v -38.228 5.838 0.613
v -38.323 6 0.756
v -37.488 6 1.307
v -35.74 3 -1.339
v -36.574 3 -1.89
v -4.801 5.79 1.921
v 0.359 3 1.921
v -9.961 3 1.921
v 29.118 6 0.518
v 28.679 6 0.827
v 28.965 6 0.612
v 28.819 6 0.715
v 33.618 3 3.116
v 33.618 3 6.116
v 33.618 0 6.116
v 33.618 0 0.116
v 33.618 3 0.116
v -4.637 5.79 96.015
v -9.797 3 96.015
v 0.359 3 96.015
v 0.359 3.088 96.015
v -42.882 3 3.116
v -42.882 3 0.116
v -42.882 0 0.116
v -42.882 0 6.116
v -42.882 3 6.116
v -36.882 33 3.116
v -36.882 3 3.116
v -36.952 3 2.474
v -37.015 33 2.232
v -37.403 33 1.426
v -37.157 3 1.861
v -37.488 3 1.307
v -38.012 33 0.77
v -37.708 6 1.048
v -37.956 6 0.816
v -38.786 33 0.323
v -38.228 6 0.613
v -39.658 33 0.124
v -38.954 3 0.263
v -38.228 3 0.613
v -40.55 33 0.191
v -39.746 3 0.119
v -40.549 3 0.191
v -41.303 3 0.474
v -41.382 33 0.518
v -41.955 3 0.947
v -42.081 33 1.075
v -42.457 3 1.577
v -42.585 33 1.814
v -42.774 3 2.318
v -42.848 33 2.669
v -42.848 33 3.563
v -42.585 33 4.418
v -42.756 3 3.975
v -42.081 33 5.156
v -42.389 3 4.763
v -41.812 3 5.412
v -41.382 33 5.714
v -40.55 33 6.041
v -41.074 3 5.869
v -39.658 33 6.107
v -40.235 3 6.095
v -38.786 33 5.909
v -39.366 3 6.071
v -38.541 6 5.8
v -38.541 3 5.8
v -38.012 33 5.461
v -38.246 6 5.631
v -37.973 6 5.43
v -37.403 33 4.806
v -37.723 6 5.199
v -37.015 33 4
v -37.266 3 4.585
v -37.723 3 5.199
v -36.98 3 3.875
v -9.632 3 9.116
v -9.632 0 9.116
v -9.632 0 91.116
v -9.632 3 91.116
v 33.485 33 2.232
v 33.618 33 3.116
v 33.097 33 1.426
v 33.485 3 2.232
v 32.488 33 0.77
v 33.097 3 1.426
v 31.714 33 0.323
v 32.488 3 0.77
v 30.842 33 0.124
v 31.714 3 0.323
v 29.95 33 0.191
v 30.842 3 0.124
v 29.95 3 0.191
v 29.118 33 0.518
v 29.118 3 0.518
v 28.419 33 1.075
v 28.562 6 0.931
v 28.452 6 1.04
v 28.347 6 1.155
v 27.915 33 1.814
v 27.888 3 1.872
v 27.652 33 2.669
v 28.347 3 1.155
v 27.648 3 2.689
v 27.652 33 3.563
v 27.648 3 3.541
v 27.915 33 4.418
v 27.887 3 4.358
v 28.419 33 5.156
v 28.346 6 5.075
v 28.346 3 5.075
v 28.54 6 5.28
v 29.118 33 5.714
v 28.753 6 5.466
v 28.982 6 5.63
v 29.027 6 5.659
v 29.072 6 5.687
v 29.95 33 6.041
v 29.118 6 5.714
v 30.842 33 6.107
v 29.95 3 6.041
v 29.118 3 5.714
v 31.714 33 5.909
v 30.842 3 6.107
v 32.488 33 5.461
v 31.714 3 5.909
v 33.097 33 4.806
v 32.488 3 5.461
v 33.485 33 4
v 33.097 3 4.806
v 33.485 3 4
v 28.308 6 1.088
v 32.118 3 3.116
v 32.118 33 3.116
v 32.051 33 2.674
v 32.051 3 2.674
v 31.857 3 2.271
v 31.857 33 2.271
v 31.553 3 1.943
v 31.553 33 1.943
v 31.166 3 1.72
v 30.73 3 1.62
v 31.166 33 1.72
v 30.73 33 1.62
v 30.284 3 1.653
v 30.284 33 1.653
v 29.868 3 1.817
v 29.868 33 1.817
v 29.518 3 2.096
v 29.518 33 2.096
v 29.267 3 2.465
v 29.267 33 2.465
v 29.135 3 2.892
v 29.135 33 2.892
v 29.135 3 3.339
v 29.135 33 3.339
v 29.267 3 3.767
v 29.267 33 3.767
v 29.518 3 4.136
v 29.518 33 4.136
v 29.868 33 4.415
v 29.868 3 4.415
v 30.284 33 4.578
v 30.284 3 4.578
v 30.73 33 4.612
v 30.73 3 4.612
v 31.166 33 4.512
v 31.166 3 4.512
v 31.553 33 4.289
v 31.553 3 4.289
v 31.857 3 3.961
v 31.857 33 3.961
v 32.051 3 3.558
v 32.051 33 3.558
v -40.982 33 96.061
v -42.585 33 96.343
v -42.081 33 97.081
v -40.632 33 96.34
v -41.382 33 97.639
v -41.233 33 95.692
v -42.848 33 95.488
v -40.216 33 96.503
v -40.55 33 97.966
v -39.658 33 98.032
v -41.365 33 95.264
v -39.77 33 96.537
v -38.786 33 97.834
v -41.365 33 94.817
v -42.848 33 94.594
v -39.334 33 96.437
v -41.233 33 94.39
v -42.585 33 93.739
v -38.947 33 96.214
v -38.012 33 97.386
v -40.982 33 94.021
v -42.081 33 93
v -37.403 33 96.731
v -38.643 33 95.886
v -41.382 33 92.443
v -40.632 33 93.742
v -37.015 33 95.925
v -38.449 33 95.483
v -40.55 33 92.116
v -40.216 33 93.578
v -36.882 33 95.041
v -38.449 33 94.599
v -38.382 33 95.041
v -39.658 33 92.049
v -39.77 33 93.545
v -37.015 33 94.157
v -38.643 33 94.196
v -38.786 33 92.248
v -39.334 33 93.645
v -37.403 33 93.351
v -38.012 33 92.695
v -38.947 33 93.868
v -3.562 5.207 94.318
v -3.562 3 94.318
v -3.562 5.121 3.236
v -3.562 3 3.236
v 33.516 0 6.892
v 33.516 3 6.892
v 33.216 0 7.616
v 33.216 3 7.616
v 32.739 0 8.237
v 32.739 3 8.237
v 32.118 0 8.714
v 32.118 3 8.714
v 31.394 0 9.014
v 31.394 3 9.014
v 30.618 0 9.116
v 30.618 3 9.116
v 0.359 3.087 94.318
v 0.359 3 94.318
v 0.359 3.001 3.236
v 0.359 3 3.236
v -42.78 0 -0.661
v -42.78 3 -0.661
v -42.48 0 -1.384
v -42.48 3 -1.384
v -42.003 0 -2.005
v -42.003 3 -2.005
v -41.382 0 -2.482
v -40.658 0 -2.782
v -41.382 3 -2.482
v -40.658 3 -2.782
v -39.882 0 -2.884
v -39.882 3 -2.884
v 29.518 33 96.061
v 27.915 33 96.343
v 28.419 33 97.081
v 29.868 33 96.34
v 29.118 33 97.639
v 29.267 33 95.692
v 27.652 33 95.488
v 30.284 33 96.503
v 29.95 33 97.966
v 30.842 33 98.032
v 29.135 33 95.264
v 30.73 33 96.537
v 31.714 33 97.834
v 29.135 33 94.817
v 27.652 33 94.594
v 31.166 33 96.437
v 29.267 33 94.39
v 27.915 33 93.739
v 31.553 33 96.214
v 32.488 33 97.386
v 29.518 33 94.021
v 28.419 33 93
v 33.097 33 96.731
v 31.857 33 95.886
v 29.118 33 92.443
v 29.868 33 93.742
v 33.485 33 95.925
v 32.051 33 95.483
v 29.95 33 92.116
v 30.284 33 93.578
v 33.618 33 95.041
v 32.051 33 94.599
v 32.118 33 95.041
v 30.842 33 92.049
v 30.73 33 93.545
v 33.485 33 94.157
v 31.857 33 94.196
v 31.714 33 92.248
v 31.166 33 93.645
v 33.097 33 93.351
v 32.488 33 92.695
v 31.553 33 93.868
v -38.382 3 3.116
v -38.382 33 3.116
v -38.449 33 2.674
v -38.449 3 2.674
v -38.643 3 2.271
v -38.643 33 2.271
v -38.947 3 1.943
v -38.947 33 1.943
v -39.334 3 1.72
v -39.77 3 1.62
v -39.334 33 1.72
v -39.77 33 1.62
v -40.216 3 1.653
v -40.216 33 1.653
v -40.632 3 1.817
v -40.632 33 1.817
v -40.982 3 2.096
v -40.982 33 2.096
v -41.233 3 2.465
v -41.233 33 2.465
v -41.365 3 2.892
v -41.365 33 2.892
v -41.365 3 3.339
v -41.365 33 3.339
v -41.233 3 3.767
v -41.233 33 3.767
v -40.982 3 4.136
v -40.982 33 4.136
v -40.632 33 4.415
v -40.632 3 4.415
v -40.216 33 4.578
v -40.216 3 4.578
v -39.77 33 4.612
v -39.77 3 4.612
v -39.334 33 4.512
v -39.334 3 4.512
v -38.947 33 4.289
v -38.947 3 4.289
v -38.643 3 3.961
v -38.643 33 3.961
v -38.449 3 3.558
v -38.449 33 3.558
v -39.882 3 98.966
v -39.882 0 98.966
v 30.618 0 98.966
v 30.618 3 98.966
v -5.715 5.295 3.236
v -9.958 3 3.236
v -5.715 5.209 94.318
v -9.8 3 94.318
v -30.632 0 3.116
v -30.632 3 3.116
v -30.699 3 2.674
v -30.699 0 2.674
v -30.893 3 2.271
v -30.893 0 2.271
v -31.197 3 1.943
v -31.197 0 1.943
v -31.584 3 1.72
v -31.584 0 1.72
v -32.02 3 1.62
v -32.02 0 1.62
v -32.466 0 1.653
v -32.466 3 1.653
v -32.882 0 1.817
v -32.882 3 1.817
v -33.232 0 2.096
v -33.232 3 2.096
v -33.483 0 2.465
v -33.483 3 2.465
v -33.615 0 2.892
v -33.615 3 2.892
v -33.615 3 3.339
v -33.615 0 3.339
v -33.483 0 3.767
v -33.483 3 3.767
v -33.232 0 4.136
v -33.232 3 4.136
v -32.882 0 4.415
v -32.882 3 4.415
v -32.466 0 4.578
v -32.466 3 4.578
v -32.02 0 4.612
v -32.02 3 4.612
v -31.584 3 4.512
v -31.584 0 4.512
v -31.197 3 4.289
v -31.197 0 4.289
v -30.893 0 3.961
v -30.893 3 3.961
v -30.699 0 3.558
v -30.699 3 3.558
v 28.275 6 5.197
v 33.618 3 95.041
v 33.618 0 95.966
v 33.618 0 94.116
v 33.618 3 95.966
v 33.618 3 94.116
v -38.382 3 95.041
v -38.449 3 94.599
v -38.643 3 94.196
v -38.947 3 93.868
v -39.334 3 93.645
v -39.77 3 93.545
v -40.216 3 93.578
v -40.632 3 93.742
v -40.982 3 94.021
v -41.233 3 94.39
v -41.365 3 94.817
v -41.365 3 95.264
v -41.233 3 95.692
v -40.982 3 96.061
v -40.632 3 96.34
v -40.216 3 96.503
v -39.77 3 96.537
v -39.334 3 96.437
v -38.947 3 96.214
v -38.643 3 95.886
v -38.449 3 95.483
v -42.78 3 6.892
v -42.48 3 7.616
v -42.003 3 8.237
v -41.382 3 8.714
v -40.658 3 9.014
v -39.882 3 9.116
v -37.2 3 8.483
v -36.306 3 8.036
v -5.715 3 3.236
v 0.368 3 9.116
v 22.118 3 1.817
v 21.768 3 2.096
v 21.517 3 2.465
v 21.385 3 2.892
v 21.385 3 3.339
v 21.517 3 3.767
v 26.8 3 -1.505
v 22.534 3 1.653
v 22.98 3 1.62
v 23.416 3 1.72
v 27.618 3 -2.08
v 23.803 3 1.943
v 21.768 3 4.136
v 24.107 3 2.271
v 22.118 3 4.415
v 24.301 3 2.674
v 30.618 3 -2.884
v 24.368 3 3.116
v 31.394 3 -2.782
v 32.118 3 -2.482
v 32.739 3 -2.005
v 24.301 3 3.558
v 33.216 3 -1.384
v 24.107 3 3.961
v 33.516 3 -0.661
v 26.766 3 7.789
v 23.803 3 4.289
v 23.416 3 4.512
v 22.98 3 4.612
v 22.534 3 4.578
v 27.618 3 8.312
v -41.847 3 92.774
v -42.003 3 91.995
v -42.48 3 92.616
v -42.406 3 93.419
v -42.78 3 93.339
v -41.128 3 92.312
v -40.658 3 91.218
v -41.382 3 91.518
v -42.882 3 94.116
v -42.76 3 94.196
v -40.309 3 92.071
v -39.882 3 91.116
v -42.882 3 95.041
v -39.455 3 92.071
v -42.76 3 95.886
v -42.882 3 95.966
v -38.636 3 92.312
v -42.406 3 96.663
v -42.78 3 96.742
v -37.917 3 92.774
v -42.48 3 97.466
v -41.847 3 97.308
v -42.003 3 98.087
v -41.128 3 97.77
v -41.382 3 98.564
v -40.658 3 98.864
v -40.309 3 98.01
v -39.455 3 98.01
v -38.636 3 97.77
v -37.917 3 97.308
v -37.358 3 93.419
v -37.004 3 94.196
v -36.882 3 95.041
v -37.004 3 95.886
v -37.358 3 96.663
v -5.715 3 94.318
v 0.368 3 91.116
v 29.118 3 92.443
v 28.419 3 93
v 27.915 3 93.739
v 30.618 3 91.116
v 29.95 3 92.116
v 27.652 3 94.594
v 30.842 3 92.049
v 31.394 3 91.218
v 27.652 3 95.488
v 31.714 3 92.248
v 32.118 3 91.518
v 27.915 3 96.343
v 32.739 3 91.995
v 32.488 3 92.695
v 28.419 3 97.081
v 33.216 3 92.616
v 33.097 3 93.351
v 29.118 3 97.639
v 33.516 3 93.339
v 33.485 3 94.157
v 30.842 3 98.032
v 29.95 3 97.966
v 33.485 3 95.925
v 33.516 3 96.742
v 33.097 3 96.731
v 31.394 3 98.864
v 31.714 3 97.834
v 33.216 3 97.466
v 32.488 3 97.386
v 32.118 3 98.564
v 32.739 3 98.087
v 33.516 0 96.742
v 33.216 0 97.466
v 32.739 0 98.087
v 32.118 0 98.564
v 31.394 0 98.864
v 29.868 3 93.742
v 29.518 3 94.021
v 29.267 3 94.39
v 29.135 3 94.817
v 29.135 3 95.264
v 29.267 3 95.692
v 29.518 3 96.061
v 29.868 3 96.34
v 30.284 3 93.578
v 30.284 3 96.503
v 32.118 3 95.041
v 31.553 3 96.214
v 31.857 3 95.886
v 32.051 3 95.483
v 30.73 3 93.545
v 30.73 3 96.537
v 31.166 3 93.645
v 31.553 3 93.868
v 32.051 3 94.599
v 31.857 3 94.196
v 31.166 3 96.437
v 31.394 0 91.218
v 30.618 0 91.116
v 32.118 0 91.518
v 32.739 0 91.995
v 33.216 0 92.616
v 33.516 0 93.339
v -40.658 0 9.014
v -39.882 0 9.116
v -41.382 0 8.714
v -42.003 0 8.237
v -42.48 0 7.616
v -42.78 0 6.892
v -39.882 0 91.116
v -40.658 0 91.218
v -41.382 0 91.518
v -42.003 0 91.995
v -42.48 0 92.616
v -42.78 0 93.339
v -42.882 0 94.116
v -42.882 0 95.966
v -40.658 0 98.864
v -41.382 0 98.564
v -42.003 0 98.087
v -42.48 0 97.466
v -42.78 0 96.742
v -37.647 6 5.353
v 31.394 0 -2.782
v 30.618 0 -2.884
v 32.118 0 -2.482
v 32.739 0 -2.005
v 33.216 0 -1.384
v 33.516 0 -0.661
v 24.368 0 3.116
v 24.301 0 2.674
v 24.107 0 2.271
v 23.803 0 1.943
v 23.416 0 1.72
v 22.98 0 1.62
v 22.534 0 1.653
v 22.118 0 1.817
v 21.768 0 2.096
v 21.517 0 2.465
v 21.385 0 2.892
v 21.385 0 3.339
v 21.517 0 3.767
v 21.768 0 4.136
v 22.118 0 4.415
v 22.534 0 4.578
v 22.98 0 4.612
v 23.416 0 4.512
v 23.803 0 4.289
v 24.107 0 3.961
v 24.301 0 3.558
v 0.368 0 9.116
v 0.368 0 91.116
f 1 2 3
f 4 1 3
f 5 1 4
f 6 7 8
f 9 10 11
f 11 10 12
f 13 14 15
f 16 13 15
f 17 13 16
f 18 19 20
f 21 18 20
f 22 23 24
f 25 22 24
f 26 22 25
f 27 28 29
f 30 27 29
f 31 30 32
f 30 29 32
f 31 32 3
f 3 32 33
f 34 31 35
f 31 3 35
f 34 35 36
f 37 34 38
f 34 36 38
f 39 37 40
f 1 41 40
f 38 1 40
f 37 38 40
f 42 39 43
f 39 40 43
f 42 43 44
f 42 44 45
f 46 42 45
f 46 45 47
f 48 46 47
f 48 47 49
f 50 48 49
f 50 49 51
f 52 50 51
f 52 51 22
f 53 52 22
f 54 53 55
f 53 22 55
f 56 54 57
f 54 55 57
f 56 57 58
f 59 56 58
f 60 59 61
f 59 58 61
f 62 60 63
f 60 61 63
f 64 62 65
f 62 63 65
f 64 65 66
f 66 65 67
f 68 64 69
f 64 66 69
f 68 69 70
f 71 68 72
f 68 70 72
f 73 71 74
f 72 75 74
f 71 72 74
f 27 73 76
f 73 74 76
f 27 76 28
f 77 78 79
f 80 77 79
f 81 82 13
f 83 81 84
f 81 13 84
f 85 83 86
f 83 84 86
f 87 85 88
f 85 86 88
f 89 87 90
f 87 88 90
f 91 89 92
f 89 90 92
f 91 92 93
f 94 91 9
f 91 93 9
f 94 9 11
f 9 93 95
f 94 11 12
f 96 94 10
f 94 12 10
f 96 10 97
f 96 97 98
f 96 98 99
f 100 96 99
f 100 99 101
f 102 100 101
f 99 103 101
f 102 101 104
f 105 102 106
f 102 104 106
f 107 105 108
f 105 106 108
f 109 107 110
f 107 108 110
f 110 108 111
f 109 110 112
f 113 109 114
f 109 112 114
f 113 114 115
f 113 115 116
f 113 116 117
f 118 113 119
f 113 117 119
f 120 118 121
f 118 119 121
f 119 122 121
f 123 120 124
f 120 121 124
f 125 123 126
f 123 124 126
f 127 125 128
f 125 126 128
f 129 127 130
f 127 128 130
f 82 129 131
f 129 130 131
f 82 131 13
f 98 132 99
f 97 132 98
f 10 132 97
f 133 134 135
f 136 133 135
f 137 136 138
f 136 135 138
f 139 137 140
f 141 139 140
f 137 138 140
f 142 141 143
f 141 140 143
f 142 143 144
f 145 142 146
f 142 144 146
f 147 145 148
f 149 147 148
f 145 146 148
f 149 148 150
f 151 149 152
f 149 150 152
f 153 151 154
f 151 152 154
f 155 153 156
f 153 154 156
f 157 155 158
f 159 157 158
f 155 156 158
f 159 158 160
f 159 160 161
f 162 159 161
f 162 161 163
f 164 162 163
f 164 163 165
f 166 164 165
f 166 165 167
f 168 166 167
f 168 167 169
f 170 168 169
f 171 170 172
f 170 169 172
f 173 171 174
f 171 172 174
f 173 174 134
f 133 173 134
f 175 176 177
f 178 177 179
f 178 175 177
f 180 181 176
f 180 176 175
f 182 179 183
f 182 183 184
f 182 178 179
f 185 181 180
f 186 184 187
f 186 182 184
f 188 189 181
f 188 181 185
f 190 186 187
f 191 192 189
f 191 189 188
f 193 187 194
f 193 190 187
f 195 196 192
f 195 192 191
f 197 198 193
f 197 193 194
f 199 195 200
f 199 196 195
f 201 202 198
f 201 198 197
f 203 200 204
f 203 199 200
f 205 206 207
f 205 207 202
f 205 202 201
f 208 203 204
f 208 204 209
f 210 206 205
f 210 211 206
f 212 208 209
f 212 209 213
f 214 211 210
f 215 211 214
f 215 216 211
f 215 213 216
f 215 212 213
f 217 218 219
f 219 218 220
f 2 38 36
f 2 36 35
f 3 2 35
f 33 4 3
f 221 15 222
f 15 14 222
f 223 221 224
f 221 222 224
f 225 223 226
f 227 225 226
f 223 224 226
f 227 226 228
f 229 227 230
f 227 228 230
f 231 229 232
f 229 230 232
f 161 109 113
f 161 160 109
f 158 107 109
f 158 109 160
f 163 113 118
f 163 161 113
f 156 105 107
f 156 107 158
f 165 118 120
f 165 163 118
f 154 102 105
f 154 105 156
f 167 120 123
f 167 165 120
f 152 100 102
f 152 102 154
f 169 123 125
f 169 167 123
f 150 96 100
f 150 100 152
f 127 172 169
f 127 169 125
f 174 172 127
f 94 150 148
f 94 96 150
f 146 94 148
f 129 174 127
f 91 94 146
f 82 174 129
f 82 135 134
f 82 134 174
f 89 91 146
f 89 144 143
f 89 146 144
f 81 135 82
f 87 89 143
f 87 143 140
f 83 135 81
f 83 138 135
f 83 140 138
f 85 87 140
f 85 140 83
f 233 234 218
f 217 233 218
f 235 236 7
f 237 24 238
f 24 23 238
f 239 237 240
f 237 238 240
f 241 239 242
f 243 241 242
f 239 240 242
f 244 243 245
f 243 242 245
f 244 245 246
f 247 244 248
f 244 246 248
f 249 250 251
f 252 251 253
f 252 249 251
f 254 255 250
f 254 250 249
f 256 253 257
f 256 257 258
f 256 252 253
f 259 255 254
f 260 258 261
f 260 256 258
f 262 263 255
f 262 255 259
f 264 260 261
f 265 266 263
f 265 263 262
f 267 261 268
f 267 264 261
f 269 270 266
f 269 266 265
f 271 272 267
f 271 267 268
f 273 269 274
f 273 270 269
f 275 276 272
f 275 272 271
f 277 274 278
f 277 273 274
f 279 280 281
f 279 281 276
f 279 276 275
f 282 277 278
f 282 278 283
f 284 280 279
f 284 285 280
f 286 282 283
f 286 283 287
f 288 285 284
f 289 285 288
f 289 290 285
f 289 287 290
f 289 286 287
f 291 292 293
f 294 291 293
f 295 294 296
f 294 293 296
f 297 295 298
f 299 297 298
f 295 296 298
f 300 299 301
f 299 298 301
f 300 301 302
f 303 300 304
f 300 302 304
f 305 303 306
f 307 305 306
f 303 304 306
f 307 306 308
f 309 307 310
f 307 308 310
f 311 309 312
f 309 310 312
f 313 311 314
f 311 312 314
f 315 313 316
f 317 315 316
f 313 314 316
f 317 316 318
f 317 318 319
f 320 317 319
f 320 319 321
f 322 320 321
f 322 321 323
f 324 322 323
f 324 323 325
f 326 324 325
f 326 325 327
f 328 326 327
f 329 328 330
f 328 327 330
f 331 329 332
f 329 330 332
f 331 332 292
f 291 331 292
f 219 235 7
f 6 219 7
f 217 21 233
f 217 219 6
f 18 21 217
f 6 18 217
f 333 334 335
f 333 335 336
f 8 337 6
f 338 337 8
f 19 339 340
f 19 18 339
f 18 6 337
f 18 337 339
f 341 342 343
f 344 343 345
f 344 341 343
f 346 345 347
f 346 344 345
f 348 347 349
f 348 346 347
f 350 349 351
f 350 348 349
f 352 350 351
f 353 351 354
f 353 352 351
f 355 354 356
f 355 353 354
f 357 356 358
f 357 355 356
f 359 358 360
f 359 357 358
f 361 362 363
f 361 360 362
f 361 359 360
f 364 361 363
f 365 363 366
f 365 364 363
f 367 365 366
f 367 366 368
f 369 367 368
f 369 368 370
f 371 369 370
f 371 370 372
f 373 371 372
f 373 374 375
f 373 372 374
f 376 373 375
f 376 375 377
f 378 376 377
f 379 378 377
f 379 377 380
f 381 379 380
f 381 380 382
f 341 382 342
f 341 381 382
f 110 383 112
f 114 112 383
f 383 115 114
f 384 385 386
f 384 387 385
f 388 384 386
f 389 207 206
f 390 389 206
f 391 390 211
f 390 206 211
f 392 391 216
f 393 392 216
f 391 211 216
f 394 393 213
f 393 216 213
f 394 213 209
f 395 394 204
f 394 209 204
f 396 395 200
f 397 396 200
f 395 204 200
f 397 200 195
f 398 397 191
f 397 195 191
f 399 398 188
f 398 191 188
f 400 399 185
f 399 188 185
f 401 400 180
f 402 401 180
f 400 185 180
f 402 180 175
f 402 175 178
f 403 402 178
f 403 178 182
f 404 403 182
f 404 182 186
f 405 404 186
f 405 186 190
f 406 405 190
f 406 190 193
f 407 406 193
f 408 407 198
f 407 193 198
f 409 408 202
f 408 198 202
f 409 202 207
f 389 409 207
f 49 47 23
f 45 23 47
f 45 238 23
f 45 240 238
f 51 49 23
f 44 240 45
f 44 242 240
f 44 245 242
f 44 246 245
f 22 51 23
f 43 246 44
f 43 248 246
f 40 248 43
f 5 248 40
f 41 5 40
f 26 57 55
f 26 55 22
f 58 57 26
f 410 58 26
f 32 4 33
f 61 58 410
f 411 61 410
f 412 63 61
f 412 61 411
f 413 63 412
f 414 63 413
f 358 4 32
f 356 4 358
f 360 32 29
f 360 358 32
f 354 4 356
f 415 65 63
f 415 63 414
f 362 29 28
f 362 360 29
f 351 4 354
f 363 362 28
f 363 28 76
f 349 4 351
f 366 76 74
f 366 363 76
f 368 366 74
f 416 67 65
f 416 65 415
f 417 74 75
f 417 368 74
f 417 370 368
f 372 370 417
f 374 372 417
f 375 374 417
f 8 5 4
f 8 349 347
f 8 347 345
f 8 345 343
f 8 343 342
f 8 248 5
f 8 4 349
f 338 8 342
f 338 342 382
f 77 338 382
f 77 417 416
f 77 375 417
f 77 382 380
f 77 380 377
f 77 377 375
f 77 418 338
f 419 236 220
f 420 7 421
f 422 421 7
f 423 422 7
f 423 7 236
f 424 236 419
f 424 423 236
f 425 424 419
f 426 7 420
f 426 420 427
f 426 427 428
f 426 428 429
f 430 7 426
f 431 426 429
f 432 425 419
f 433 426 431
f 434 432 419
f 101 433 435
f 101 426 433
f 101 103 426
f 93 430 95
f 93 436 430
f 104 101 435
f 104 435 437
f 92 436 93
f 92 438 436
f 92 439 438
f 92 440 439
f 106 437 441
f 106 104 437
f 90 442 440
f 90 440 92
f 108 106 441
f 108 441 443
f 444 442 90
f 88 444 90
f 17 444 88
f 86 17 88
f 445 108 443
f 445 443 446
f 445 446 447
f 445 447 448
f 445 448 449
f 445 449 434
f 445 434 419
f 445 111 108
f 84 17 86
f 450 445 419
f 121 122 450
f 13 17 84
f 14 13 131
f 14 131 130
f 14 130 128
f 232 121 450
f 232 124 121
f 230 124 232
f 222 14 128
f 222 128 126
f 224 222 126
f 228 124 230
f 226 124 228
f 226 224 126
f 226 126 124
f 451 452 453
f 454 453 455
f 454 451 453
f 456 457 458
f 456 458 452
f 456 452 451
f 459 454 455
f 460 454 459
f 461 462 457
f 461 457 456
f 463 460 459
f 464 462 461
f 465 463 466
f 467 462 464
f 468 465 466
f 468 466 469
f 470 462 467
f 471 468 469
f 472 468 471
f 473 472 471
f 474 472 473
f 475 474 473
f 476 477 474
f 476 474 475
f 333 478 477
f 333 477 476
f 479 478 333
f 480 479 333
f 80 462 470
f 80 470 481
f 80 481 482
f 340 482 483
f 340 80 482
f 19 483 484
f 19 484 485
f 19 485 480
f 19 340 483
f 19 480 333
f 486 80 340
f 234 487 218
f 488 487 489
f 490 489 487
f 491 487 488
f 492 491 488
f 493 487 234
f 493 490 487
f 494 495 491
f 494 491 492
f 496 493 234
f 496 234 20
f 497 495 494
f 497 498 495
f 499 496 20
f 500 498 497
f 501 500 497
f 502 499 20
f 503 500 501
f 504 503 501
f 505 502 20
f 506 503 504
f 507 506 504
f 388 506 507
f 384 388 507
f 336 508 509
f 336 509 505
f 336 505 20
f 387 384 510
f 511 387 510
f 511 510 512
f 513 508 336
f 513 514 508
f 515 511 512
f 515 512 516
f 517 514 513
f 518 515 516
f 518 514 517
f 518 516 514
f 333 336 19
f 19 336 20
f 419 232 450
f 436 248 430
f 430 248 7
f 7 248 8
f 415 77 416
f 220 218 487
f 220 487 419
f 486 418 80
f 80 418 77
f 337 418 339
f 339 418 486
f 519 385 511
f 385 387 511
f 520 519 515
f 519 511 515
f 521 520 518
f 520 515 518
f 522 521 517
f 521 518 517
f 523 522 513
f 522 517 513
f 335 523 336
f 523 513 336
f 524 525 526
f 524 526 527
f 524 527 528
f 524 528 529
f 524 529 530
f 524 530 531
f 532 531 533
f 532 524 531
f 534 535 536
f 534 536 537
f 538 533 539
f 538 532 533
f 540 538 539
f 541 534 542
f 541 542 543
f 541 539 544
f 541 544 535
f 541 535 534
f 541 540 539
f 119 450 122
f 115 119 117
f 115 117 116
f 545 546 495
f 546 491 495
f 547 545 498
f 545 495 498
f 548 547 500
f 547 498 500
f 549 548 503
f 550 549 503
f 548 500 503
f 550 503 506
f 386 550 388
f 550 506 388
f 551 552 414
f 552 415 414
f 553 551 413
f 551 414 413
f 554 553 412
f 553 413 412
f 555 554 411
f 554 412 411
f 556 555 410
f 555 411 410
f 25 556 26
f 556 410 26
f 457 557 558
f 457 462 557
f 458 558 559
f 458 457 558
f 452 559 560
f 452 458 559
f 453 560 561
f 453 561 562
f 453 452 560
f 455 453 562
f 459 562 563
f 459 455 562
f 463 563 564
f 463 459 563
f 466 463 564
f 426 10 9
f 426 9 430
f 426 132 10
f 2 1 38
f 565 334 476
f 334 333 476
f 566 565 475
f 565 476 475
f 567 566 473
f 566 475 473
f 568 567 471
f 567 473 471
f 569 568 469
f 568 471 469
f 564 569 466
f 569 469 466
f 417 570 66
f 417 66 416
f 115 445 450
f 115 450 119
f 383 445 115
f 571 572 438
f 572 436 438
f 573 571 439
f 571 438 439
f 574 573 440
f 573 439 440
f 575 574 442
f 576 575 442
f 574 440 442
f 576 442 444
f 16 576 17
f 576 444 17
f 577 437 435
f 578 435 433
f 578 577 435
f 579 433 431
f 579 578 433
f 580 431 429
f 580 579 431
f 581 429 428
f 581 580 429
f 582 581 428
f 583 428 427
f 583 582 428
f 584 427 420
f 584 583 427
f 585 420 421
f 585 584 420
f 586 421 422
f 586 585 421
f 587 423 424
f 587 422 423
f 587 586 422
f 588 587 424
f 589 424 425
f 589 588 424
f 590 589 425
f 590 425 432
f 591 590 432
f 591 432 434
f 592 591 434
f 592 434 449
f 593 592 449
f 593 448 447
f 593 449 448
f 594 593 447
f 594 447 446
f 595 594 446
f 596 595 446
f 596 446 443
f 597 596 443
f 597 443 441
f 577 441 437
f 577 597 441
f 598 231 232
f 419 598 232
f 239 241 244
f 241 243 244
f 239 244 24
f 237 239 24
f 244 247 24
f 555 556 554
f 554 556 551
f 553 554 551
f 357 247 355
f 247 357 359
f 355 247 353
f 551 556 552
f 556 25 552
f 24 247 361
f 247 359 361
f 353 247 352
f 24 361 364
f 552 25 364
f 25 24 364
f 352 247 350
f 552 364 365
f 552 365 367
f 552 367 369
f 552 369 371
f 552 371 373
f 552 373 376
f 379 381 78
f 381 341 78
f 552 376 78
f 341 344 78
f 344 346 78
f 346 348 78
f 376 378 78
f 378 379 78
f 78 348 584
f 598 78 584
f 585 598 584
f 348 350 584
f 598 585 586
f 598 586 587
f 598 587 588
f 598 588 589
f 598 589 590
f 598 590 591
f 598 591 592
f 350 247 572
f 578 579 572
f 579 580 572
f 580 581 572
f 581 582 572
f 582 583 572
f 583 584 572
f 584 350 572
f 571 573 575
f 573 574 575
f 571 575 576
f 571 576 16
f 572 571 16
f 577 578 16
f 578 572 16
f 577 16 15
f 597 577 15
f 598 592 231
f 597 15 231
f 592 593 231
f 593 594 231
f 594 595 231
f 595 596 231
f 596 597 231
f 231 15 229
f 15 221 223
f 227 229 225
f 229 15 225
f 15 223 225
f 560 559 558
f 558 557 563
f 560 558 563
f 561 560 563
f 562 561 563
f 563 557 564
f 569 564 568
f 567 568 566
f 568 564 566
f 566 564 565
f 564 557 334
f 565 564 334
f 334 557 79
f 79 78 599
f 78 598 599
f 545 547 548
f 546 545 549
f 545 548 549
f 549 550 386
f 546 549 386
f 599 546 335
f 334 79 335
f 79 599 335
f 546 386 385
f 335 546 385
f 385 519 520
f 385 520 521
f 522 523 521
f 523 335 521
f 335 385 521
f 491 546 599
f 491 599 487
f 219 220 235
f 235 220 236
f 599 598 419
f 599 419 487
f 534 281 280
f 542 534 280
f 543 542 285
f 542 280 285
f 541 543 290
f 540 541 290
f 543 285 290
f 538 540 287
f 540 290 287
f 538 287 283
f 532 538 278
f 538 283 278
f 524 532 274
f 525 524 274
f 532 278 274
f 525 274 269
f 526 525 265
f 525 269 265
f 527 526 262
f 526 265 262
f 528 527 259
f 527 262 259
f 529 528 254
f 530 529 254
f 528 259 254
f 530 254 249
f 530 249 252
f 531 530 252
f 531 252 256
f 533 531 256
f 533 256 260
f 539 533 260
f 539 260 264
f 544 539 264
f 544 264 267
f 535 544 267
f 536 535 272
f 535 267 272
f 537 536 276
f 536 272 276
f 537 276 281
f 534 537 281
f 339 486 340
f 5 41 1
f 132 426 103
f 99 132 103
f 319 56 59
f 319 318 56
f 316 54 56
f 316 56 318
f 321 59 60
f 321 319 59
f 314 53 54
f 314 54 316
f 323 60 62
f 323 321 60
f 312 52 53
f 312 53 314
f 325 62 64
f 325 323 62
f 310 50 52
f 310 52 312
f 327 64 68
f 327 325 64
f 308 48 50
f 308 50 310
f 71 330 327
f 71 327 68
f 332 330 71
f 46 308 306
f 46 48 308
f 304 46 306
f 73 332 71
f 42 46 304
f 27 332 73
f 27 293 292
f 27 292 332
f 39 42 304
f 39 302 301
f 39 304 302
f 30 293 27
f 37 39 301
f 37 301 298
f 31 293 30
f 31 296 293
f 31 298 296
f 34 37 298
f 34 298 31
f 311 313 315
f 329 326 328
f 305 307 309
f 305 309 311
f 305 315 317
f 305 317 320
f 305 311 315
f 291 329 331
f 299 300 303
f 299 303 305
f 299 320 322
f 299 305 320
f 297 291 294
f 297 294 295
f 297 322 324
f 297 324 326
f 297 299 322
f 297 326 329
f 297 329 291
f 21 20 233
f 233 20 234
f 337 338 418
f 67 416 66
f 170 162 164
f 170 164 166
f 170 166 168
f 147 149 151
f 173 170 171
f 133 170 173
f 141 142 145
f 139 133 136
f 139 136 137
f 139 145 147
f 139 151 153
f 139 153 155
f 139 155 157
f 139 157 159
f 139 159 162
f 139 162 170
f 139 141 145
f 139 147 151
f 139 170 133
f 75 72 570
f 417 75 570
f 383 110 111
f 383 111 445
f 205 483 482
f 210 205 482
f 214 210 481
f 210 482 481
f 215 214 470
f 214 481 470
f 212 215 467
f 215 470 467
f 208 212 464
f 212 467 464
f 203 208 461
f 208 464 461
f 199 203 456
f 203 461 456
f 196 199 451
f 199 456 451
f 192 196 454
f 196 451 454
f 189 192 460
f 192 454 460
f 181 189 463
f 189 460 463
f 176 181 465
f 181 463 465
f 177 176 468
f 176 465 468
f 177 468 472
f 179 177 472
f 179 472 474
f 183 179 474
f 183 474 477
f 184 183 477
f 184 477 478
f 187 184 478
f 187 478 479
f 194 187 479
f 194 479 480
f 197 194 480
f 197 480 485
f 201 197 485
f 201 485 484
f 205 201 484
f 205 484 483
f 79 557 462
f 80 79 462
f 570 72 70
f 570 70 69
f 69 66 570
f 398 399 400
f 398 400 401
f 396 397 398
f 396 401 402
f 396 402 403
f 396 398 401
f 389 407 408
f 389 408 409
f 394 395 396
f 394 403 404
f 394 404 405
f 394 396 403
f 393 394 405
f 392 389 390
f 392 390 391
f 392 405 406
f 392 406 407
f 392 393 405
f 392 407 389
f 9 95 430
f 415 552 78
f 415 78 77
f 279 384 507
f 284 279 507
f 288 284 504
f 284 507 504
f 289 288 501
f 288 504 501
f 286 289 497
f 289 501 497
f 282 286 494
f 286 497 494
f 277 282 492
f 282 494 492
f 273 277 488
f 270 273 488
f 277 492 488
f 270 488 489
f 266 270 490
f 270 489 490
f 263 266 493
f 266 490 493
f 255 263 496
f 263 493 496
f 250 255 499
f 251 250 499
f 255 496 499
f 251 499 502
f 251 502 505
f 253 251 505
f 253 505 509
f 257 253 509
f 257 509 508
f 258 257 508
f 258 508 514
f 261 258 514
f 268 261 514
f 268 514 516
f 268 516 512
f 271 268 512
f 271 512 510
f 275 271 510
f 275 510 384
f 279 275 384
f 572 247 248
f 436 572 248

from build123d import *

# Parameters (mm, degrees)
SKETCH_1_W          = 70.5
SKETCH_1_H          = 12
SKETCH_1_R          = 1.5
EXTRUDE_2_DEPTH     = 4
SKETCH_3_W          = 10
SKETCH_3_H          = 82
EXTRUDE_3_DEPTH     = 3
EXTRUDE_4_DEPTH     = 3
SKETCH_5_W          = 70.5
SKETCH_5_H          = 12.216564443
CUT_EXTRUDE_1_DEPTH = 1
SKETCH_6_R          = 3
EXTRUDE_5_DEPTH     = 30
SKETCH_7_W          = 12
SKETCH_7_H          = 3
EXTRUDE_6_DEPTH     = 3
SKETCH_8_W          = 12
SKETCH_8_H          = 3
EXTRUDE_7_DEPTH     = 3
SKETCH_10_W         = 7.85
SKETCH_10_H         = 3
EXTRUDE_8_DEPTH     = 3
SKETCH_11_W         = 7.85
SKETCH_11_H         = 3
EXTRUDE_9_DEPTH     = 3
FILLET_1_R          = 3
EXTRUDE_10_DEPTH    = 3
SKETCH_26_R         = 1.5
CUT_EXTRUDE_2_DEPTH = 30
SKETCH_28_R         = 1.5
CUT_EXTRUDE_3_DEPTH = 30
SKETCH_30_R         = 1.5
CUT_EXTRUDE_4_DEPTH = 30
SKETCH_29_R         = 1.5
CUT_EXTRUDE_5_DEPTH = 30


with BuildPart() as part:
    # 草图1 → 凸台-拉伸2 (new body)
    with BuildSketch(Plane(origin=(0, 0, 0), x_dir=(1, 0, 0), z_dir=(0, 1, 0))):
        with Locations((-4.632001312, -3.115886014)):
            Rectangle(SKETCH_1_W, SKETCH_1_H)
        with Locations((-32.132001312, -3.115886014)):
            Circle(SKETCH_1_R, mode=Mode.SUBTRACT)
        with Locations((22.867998688, -3.115886014)):
            Circle(SKETCH_1_R, mode=Mode.SUBTRACT)
    extrude(amount=EXTRUDE_2_DEPTH)

    # 草图3 → 凸台-拉伸3 (add)
    with BuildSketch(Plane.XZ):
        with Locations((-4.632001312, 50.115886014)):
            Rectangle(SKETCH_3_W, SKETCH_3_H)
    extrude(amount=-EXTRUDE_3_DEPTH)

    # 草图4 → 凸台-拉伸4 (add)
    with BuildSketch(Plane(origin=(0, 3, 0), x_dir=(1, 0, 0), z_dir=(0, 1, 0))):
        Polygon((-4.632001312, -91.115886014), (-39.882001312, -91.115886014), (-39.882001312, -98.965886014), (30.617998688, -98.965886014), (30.617998688, -91.115886014), align=None)
    extrude(amount=-EXTRUDE_4_DEPTH)

    # 草图5 → 切除-拉伸1 (cut)
    with BuildSketch(Plane(origin=(0, 4, 0), x_dir=(1, 0, 0), z_dir=(0, 1, 0))):
        with Locations((-4.632001312, -3.224168236)):
            Rectangle(SKETCH_5_W, SKETCH_5_H)
    extrude(amount=-CUT_EXTRUDE_1_DEPTH, mode=Mode.SUBTRACT)

    # 草图6 → 凸台-拉伸5 (add)
    with BuildSketch(Plane(origin=(0, 3, 0), x_dir=(1, 0, 0), z_dir=(0, 1, 0))):
        with Locations((30.617998688, -3.115886014)):
            Circle(SKETCH_6_R)
        with Locations((-39.882001312, -3.115886014)):
            Circle(SKETCH_6_R)
        with Locations((30.617998688, -95.040886014)):
            Circle(SKETCH_6_R)
        with Locations((-39.882001312, -95.040886014)):
            Circle(SKETCH_6_R)
    extrude(amount=EXTRUDE_5_DEPTH)

    # 草图7 → 凸台-拉伸6 (add)
    with BuildSketch(Plane(origin=(30.617998688, 0, 0), x_dir=(0, 0, -1), z_dir=(1, 0, 0))):
        with Locations((-3.115886014, 1.5)):
            Rectangle(SKETCH_7_W, SKETCH_7_H)
    extrude(amount=EXTRUDE_6_DEPTH)

    # 草图8 → 凸台-拉伸7 (add)
    with BuildSketch(Plane.ZY.offset(39.882001312)):
        with Locations((3.115886014, 1.5)):
            Rectangle(SKETCH_8_W, SKETCH_8_H)
    extrude(amount=EXTRUDE_7_DEPTH)

    # 草图10 → 凸台-拉伸8 (add)
    with BuildSketch(Plane(origin=(30.617998688, 0, 0), x_dir=(0, 0, -1), z_dir=(1, 0, 0))):
        with Locations((-95.040886014, 1.5)):
            Rectangle(SKETCH_10_W, SKETCH_10_H)
    extrude(amount=EXTRUDE_8_DEPTH)

    # 草图11 → 凸台-拉伸9 (add)
    with BuildSketch(Plane.ZY.offset(39.882001312)):
        with Locations((95.040886014, 1.5)):
            Rectangle(SKETCH_11_W, SKETCH_11_H)
    extrude(amount=EXTRUDE_9_DEPTH)

    # 圆角1
    fillet_1_edges = [part.edges().sort_by_distance(p)[0] for p in [
        (-42.882001312, 1.5, 9.115886014),
        (-42.882001312, 1.5, -2.884113986),
        (33.617998688, 1.5, -2.884113986),
        (33.617998688, 1.5, 9.115886014),
        (33.617998688, 1.5, 91.115886014),
        (33.617998688, 1.5, 98.965886014),
        (-42.882001312, 1.5, 91.115886014),
        (-42.882001312, 1.5, 98.965886014),
    ]]
    fillet(fillet_1_edges, radius=FILLET_1_R)

    # 草图12 → 凸台-拉伸10 (add)
    with BuildSketch(Plane(origin=(0, 3, 0), x_dir=(1, 0, 0), z_dir=(0, 1, 0))):
        Polygon((-39.882001312, -3.115886014), (-36.574447776, 1.890119339), (-35.74011355, 1.338860417), (-38.729397599, -3.185441847), (-36.305878929, -8.036388905), (-37.200450273, -8.483314078), align=None)
        Polygon((30.617998688, -3.115886014), (27.617998688, 2.080266408), (26.800231701, 1.50471697), (29.487170484, -3.115886014), (26.765595108, -7.789153997), (27.617998688, -8.312038437), align=None)
        Polygon((-9.960523859, -3.236448921), (-5.714518795, -3.236448921), (-5.714518795, -94.31838866), (-9.960523859, -94.31838866), (-9.960523859, -96.014577306), (0.358950446, -96.014577306), (0.358950446, -94.31838866), (-3.561614819, -94.31838866), (-3.561614819, -3.236448921), (0.358950446, -3.236448921), (0.358950446, -1.92078538), (0, -1.92078538), (-9.960523859, -1.92078538), align=None)
    extrude(amount=EXTRUDE_10_DEPTH)

    # 切除-扫描1: sweep along a path in 草图14
    with BuildLine(Plane(origin=(-10.245146765, 0, 15.506101105), x_dir=(-0.834334226, 0, -0.551258923), z_dir=(0.551258923, 0, -0.834334226))) as sweep_1_path:
        Line((30.557258713, 3), (31.557258713, 3))
    # 草图13 → 切除-扫描1 (sweep, cut)
    with BuildSketch(Plane(origin=(-25.494966785, 0, -16.844961522), x_dir=(0.551258923, 0, -0.834334226), z_dir=(0.834334226, 0, 0.551258923))):
        Polygon((-21.756572303, 6), (-18.584999427, 3), (-18.584999427, 6), align=None)
    sweep(path=sweep_1_path.line, mode=Mode.SUBTRACT)

    # 切除-扫描2: sweep along a path in 草图16
    with BuildLine(Plane(origin=(-4.038812737, 0, -8.084141049), x_dir=(0.894571344, 0, -0.446925173), z_dir=(0.446925173, 0, 0.894571344))) as sweep_2_path:
        Line((-37.069863413, 3), (-36.069863413, 3))
    # 草图15 → 切除-扫描2 (sweep, cut)
    with BuildSketch(Plane(origin=(-33.161637535, 0, 16.567455127), x_dir=(0.446925173, 0, 0.894571344), z_dir=(-0.894571344, 0, 0.446925173))):
        Polygon((-12.036888006, 6), (-9.036888006, 3), (-9.036888006, 6), align=None)
    sweep(path=sweep_2_path.line, mode=Mode.SUBTRACT)

    # 切除-扫描3: sweep along a path in 草图18
    with BuildLine(Plane(origin=(8.169550431, 0, 11.607671187), x_dir=(-0.817766986, 0, 0.575549439), z_dir=(-0.575549439, 0, -0.817766986))) as sweep_3_path:
        Line((-23.782383716, 3), (-22.782383716, 3))
    # 草图17 → 切除-扫描3 (sweep, cut)
    with BuildSketch(Plane(origin=(21.614280794, 0, -12.479010835), x_dir=(-0.5, 0, -0.866025404), z_dir=(0.866025404, 0, -0.5))):
        Polygon((-15.007435787, 6), (-12.007435787, 3), (-12.007435787, 6), align=None)
    sweep(path=sweep_3_path.line, mode=Mode.SUBTRACT)

    # 切除-扫描4: sweep along a path in 草图20
    with BuildLine(Plane(origin=(3.846238842, 0, -6.270119175), x_dir=(0.852403579, 0, 0.52288444), z_dir=(-0.52288444, 0, 0.852403579))) as sweep_4_path:
        Line((27.887916501, 3), (26.887916501, 3))
    # 草图19 → 切除-扫描4 (sweep, cut)
    with BuildSketch(Plane(origin=(24.312717238, 0, 14.036953842), x_dir=(0.5, 0, -0.866025404), z_dir=(0.866025404, 0, 0.5))):
        Polygon((9.6105629, 6), (6.6105629, 3), (6.6105629, 6), align=None)
    sweep(path=sweep_4_path.line, mode=Mode.SUBTRACT)

    # 切除-扫描8: sweep along a path in 草图25
    with BuildLine(Plane(origin=(0, 3, 0), x_dir=(1, 0, 0), z_dir=(0, 1, 0))) as sweep_8_path:
        Line((-4.800786706, -1.92078538), (-4.632001312, -98.965886014))
    # 草图24 → 切除-扫描8 (sweep, cut)
    with BuildSketch(Plane(origin=(0, 0, 1.92078538), x_dir=(-1, 0, 0), z_dir=(0, 0, -1))):
        Polygon((-0.358950446, 3), (4.800786706, 5.789897824), (9.960523859, 3), (10.109613681, 3), (10.681927492, 3), (10.681927492, 6), (10.109613681, 6), (-0.358950446, 6), align=None)
    sweep(path=sweep_8_path.line, mode=Mode.SUBTRACT)

    # 草图26 → 切除-拉伸2 (cut)
    with BuildSketch(Plane(origin=(0, 33, 0), x_dir=(1, 0, 0), z_dir=(0, 1, 0))):
        with Locations((-39.882001312, -95.040886014)):
            Circle(SKETCH_26_R)
    extrude(amount=-CUT_EXTRUDE_2_DEPTH, mode=Mode.SUBTRACT)

    # 草图28 → 切除-拉伸3 (cut)
    with BuildSketch(Plane(origin=(0, 33, 0), x_dir=(1, 0, 0), z_dir=(0, 1, 0))):
        with Locations((30.617998688, -95.040886014)):
            Circle(SKETCH_28_R)
    extrude(amount=-CUT_EXTRUDE_3_DEPTH, mode=Mode.SUBTRACT)

    # 草图30 → 切除-拉伸4 (cut)
    with BuildSketch(Plane(origin=(0, 33, 0), x_dir=(1, 0, 0), z_dir=(0, 1, 0))):
        with Locations((30.617998688, -3.115886014)):
            Circle(SKETCH_30_R)
    extrude(amount=-CUT_EXTRUDE_4_DEPTH, mode=Mode.SUBTRACT)

    # 草图29 → 切除-拉伸5 (cut)
    with BuildSketch(Plane(origin=(0, 33, 0), x_dir=(1, 0, 0), z_dir=(0, 1, 0))):
        with Locations((-39.882001312, -3.115886014)):
            Circle(SKETCH_29_R)
    extrude(amount=-CUT_EXTRUDE_5_DEPTH, mode=Mode.SUBTRACT)


solid = part.part
